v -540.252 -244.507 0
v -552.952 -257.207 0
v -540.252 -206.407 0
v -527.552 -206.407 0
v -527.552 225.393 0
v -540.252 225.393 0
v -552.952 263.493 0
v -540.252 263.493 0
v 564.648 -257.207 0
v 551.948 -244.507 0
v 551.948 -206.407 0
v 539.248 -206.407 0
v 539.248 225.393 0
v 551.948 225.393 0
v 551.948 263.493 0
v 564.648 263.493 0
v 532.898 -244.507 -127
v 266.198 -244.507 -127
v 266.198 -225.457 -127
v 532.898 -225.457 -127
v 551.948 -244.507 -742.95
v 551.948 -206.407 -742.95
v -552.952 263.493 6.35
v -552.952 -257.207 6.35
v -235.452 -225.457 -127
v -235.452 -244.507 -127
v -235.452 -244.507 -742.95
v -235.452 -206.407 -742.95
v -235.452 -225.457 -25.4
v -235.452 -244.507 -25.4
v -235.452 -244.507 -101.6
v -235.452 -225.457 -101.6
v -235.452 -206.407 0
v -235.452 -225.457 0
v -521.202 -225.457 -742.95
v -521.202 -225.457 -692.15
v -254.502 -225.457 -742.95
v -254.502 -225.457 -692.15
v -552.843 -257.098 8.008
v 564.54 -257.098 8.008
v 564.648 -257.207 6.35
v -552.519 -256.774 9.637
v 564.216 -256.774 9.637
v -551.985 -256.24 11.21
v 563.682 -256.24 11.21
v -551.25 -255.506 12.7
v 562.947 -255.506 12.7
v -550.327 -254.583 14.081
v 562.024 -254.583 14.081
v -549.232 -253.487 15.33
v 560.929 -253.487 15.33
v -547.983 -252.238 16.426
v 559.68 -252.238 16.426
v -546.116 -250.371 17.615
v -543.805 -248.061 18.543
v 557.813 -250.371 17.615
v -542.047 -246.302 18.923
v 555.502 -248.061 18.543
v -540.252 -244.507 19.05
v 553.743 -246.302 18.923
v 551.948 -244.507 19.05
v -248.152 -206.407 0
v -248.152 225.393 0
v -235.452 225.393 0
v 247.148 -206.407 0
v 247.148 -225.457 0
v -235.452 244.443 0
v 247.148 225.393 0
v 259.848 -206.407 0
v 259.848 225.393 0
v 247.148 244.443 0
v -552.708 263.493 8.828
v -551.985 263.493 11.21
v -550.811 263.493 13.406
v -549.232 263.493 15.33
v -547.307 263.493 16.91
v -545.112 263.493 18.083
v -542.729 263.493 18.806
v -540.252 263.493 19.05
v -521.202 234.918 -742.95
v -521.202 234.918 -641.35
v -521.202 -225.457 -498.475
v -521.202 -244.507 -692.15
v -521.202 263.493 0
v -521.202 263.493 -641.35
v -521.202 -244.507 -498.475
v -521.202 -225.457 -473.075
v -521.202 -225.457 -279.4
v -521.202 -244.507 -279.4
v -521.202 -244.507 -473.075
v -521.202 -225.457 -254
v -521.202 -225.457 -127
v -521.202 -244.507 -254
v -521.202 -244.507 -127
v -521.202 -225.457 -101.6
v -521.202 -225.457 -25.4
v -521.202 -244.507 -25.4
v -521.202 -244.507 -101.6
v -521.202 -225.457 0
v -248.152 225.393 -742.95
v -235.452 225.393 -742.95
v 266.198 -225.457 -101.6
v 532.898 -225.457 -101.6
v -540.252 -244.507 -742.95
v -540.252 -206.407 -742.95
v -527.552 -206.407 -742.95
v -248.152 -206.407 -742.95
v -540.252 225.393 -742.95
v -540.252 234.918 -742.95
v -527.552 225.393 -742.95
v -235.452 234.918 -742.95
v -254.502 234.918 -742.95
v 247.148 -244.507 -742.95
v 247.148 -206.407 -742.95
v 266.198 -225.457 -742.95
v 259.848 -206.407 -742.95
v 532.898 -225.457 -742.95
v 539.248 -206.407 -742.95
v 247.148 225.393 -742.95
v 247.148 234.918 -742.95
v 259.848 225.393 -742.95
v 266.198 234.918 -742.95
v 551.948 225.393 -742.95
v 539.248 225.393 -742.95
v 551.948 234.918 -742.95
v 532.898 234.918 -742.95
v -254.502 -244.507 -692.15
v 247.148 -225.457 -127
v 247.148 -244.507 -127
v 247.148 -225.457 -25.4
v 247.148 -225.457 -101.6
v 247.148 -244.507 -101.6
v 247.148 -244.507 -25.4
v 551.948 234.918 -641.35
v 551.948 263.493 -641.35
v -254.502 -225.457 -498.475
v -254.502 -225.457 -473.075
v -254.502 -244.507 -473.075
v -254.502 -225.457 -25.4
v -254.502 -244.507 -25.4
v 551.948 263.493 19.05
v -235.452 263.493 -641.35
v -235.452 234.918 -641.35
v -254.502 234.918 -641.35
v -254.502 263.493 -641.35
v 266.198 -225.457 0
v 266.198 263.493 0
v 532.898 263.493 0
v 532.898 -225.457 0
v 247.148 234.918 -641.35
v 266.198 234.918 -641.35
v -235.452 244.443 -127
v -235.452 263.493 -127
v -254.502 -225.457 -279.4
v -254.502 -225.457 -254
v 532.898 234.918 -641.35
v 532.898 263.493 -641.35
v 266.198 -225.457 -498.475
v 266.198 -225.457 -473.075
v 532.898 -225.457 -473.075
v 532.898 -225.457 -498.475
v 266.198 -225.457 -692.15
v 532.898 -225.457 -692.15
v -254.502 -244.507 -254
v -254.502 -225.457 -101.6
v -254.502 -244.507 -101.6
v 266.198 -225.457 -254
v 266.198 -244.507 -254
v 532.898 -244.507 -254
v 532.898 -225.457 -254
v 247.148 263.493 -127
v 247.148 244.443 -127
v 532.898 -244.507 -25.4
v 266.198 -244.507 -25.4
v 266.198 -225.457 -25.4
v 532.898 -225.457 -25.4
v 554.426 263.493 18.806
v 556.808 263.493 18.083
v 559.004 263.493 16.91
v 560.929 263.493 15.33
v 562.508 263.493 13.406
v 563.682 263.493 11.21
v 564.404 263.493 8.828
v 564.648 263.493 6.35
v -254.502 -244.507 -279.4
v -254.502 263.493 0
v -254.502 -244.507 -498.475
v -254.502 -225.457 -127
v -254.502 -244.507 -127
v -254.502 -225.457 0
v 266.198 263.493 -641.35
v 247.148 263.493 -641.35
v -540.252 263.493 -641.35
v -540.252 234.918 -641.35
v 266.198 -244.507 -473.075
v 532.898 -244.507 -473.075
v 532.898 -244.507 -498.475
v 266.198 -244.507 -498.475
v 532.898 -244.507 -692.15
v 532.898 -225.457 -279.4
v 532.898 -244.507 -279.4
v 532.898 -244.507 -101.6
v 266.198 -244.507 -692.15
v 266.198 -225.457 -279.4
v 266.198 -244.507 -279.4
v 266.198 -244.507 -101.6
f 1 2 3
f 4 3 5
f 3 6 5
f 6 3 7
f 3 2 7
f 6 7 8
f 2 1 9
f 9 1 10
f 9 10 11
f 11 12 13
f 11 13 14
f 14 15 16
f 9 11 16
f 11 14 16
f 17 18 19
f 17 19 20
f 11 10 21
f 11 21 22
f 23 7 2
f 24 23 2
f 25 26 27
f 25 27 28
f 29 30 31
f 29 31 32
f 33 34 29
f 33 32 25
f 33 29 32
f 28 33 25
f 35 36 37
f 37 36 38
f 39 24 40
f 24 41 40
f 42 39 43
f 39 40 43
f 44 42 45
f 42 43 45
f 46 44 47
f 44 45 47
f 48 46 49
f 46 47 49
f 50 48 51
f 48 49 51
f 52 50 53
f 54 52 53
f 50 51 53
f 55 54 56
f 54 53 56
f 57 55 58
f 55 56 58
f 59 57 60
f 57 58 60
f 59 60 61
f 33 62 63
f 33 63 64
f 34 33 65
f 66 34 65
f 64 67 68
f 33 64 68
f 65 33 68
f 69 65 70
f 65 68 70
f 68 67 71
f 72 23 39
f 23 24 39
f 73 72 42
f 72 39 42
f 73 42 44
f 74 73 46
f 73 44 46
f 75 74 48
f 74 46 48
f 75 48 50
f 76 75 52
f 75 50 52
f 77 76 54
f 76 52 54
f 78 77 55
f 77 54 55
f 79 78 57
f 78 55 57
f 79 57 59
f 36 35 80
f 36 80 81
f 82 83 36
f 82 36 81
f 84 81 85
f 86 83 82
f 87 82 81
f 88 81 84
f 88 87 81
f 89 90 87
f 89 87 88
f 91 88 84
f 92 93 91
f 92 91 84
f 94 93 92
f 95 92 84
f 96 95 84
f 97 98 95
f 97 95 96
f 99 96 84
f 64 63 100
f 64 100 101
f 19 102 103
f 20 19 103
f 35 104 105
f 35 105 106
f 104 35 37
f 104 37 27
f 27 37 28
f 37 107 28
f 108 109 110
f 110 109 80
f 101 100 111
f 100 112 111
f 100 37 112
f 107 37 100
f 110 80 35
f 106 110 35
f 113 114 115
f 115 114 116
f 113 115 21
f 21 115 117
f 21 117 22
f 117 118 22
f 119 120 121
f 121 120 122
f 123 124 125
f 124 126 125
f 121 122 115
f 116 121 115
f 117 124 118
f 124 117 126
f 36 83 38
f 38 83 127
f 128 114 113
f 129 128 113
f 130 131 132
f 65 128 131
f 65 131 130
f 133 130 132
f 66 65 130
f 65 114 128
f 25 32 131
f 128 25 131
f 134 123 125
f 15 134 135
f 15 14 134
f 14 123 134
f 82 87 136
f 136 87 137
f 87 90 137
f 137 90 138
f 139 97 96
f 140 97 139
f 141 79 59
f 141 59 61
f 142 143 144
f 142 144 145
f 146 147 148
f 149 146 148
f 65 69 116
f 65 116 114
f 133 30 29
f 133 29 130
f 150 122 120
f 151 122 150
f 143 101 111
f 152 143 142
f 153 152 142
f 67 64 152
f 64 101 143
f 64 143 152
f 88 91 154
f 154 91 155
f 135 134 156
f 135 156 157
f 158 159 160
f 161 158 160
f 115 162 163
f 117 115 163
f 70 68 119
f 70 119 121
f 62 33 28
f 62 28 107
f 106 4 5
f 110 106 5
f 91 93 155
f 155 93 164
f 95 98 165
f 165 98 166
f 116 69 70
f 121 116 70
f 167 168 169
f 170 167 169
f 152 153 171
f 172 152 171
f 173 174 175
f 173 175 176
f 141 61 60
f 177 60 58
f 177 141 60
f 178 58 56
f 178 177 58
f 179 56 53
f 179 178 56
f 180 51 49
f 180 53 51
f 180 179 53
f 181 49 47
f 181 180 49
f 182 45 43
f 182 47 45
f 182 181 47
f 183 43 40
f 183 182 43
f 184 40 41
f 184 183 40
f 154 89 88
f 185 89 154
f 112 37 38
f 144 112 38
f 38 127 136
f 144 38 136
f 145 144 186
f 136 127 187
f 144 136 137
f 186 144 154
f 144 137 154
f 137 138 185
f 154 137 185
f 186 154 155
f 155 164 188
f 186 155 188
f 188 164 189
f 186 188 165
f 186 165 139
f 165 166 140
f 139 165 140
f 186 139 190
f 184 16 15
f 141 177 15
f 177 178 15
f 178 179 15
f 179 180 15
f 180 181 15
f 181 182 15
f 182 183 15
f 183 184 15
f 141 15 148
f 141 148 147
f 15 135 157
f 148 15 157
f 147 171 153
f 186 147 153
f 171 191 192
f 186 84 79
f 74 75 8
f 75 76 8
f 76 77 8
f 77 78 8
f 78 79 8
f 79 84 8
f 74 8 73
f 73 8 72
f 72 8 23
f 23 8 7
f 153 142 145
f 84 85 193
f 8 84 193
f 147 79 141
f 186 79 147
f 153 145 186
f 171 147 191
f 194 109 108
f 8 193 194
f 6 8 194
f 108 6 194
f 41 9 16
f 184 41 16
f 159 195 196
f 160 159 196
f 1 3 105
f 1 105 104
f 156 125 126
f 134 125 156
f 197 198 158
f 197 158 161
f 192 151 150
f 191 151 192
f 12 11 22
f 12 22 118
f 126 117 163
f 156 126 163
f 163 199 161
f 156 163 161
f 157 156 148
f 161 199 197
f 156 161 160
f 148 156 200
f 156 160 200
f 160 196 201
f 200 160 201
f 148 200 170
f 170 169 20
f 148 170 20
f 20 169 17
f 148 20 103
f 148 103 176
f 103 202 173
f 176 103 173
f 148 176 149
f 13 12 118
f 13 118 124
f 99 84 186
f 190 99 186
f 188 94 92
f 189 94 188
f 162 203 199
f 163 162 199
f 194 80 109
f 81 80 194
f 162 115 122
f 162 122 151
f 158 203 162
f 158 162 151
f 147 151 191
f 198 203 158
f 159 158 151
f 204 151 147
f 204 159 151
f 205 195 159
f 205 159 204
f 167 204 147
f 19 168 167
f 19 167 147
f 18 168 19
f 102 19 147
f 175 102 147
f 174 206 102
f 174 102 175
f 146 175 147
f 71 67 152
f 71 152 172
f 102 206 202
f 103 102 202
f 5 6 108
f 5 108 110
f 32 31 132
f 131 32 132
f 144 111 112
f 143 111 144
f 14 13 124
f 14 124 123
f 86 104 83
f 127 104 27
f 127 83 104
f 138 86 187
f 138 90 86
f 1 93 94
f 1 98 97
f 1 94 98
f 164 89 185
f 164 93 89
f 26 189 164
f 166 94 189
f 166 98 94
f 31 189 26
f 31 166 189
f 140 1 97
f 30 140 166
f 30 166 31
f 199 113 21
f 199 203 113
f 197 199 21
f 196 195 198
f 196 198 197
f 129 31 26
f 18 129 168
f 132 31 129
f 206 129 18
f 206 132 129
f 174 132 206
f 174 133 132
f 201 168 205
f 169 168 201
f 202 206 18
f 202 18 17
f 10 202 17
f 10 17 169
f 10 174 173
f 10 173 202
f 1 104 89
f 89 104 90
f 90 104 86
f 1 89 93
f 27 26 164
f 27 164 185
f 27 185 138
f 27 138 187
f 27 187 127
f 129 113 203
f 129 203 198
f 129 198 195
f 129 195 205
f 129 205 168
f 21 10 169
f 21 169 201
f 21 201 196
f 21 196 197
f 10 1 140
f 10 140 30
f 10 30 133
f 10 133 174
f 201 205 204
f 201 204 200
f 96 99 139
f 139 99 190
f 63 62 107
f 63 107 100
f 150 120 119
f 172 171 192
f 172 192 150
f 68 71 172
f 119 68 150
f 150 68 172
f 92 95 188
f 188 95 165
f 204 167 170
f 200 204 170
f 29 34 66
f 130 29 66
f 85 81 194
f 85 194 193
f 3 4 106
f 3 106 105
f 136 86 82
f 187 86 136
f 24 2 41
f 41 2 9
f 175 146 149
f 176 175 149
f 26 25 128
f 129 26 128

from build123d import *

# Parameters (mm, degrees)
F0_W      = 266.7
F0_H      = 19.05
F0_W_2    = 6.35
F0_H_2    = 431.8
F0_W_3    = 482.6
F1_DEPTH  = 19.05
F2_DEPTH  = 742.95
F3_R      = 12.7
F4_DEPTH  = 127
F5_DEPTH  = 127
F6_DEPTH  = 742.95
F7_W      = 482.6
F7_H      = 76.2
F7_W_2    = 266.7
F7_H_2    = 193.675
F7_H_3    = 127
F8_DEPTH  = 25.4
F9_W      = 28.575
F9_H      = 101.6
F10_DEPTH = 1104.901


with BuildPart() as f1:
    # F0 (on Top) → F1 (new body)
    with BuildSketch(Plane.XY):
        Polygon((532.898358, 244.44298), (266.198358, 244.44298), (266.198358, 225.39298), (266.198358, -206.40702), (266.198358, -225.45702), (532.898358, -225.45702), (532.898358, -206.40702), (532.898358, 225.39298), align=None)
        Polygon((266.198358, 263.49298), (247.148358, 263.49298), (247.148358, 244.44298), (247.148358, 225.39298), (259.848358, 225.39298), (266.198358, 225.39298), (266.198358, 244.44298), align=None)
        with Locations((399.548358, 253.96798)):
            Rectangle(F0_W, F0_H)
        Polygon((551.948358, 263.49298), (532.898358, 263.49298), (532.898358, 244.44298), (532.898358, 225.39298), (539.248358, 225.39298), (551.948358, 225.39298), align=None)
        with Locations((263.023358, 9.49298)):
            Rectangle(F0_W_2, F0_H_2)
        with Locations((536.073358, 9.49298)):
            Rectangle(F0_W_2, F0_H_2)
        with Locations((-387.851642, 253.96798)):
            Rectangle(F0_W, F0_H)
        Polygon((-235.451642, 263.49298), (-254.501642, 263.49298), (-254.501642, 244.44298), (-254.501642, 225.39298), (-248.151642, 225.39298), (-235.451642, 225.39298), (-235.451642, 244.44298), align=None)
        with Locations((-387.851642, -234.98202)):
            Rectangle(F0_W, F0_H)
        with Locations((399.548358, -234.98202)):
            Rectangle(F0_W, F0_H)
        Polygon((-521.201642, -225.45702), (-521.201642, -206.40702), (-527.551642, -206.40702), (-540.251642, -206.40702), (-540.251642, -244.50702), (-521.201642, -244.50702), align=None)
        Polygon((-248.151642, -206.40702), (-254.501642, -206.40702), (-254.501642, -225.45702), (-254.501642, -244.50702), (-235.451642, -244.50702), (-235.451642, -225.45702), (-235.451642, -206.40702), align=None)
        Polygon((266.198358, -206.40702), (259.848358, -206.40702), (247.148358, -206.40702), (247.148358, -225.45702), (247.148358, -244.50702), (266.198358, -244.50702), (266.198358, -225.45702), align=None)
        Polygon((539.248358, -206.40702), (532.898358, -206.40702), (532.898358, -225.45702), (532.898358, -244.50702), (551.948358, -244.50702), (551.948358, -206.40702), align=None)
        Polygon((-521.201642, 244.44298), (-521.201642, 263.49298), (-540.251642, 263.49298), (-540.251642, 225.39298), (-527.551642, 225.39298), (-521.201642, 225.39298), align=None)
        with Locations((-524.376642, 9.49298)):
            Rectangle(F0_W_2, F0_H_2)
        with Locations((-251.326642, 9.49298)):
            Rectangle(F0_W_2, F0_H_2)
        Polygon((-254.501642, 244.44298), (-521.201642, 244.44298), (-521.201642, 225.39298), (-521.201642, -206.40702), (-521.201642, -225.45702), (-254.501642, -225.45702), (-254.501642, -206.40702), (-254.501642, 225.39298), align=None)
        Polygon((-540.251642, 225.39298), (-540.251642, 263.49298), (-552.951642, 263.49298), (-552.951642, -257.20702), (564.648358, -257.20702), (564.648358, 263.49298), (551.948358, 263.49298), (551.948358, 225.39298), (539.248358, 225.39298), (539.248358, -206.40702), (551.948358, -206.40702), (551.948358, -244.50702), (532.898358, -244.50702), (266.198358, -244.50702), (247.148358, -244.50702), (-235.451642, -244.50702), (-254.501642, -244.50702), (-521.201642, -244.50702), (-540.251642, -244.50702), (-540.251642, -206.40702), (-527.551642, -206.40702), (-527.551642, 225.39298), align=None)
        with Locations((5.848358, 253.96798)):
            Rectangle(F0_W_3, F0_H)
        Polygon((247.148358, 244.44298), (-235.451642, 244.44298), (-235.451642, 225.39298), (-248.151642, 225.39298), (-248.151642, -206.40702), (-235.451642, -206.40702), (-235.451642, -225.45702), (247.148358, -225.45702), (247.148358, -206.40702), (259.848358, -206.40702), (259.848358, 225.39298), (247.148358, 225.39298), align=None)
        with Locations((5.848358, -234.98202)):
            Rectangle(F0_W_3, F0_H)
    extrude(amount=F1_DEPTH)

    # F0 (on Top) → F2 (join)
    with BuildSketch(Plane.XY):
        Polygon((-248.151642, -206.40702), (-254.501642, -206.40702), (-254.501642, -225.45702), (-254.501642, -244.50702), (-235.451642, -244.50702), (-235.451642, -225.45702), (-235.451642, -206.40702), align=None)
        Polygon((-521.201642, -225.45702), (-521.201642, -206.40702), (-527.551642, -206.40702), (-540.251642, -206.40702), (-540.251642, -244.50702), (-521.201642, -244.50702), align=None)
        with Locations((-524.376642, 9.49298)):
            Rectangle(F0_W_2, F0_H_2)
        with Locations((-251.326642, 9.49298)):
            Rectangle(F0_W_2, F0_H_2)
        Polygon((-521.201642, 244.44298), (-521.201642, 263.49298), (-540.251642, 263.49298), (-540.251642, 225.39298), (-527.551642, 225.39298), (-521.201642, 225.39298), align=None)
        Polygon((-235.451642, 263.49298), (-254.501642, 263.49298), (-254.501642, 244.44298), (-254.501642, 225.39298), (-248.151642, 225.39298), (-235.451642, 225.39298), (-235.451642, 244.44298), align=None)
        Polygon((266.198358, 263.49298), (247.148358, 263.49298), (247.148358, 244.44298), (247.148358, 225.39298), (259.848358, 225.39298), (266.198358, 225.39298), (266.198358, 244.44298), align=None)
        Polygon((551.948358, 263.49298), (532.898358, 263.49298), (532.898358, 244.44298), (532.898358, 225.39298), (539.248358, 225.39298), (551.948358, 225.39298), align=None)
        Polygon((266.198358, -206.40702), (259.848358, -206.40702), (247.148358, -206.40702), (247.148358, -225.45702), (247.148358, -244.50702), (266.198358, -244.50702), (266.198358, -225.45702), align=None)
        Polygon((539.248358, -206.40702), (532.898358, -206.40702), (532.898358, -225.45702), (532.898358, -244.50702), (551.948358, -244.50702), (551.948358, -206.40702), align=None)
        with Locations((536.073358, 9.49298)):
            Rectangle(F0_W_2, F0_H_2)
        with Locations((263.023358, 9.49298)):
            Rectangle(F0_W_2, F0_H_2)
    extrude(amount=-F2_DEPTH)

    # F3
    f3_edges = [f1.edges().sort_by_distance(p)[0] for p in [
        (-552.951642, 3.14298, 19.05),
        (5.848358, -257.20702, 19.05),
        (564.648358, 3.14298, 19.05),
    ]]
    fillet(f3_edges, radius=F3_R)

    # F0 (on Top) → F4 (join)
    with BuildSketch(Plane.XY):
        with Locations((5.848358, 253.96798)):
            Rectangle(F0_W_3, F0_H)
    extrude(amount=-F4_DEPTH)

    # F0 (on Top) → F5 (join)
    with BuildSketch(Plane.XY):
        with Locations((5.848358, -234.98202)):
            Rectangle(F0_W_3, F0_H)
    extrude(amount=-F5_DEPTH)

    # F0 (on Top) → F6 (join, through all)
    with BuildSketch(Plane.XY):
        with Locations((-387.851642, -234.98202)):
            Rectangle(F0_W, F0_H)
        with Locations((399.548358, -234.98202)):
            Rectangle(F0_W, F0_H)
    extrude(amount=-F6_DEPTH)

    # F7 (on face) → F8 (cut)
    with BuildSketch(Plane.XZ.offset(244.50702)):
        with Locations((5.848358, -63.5)):
            Rectangle(F7_W, F7_H)
        with Locations((-387.851642, -376.2375)):
            Rectangle(F7_W_2, F7_H_2)
        with Locations((-387.851642, -190.5)):
            Rectangle(F7_W_2, F7_H_3)
        with Locations((-387.851642, -63.5)):
            Rectangle(F7_W_2, F7_H)
        with Locations((-387.851642, -595.3125)):
            Rectangle(F7_W_2, F7_H_2)
        with Locations((399.548358, -595.3125)):
            Rectangle(F7_W_2, F7_H_2)
        with Locations((399.548358, -376.2375)):
            Rectangle(F7_W_2, F7_H_2)
        with Locations((399.548358, -190.5)):
            Rectangle(F7_W_2, F7_H_3)
        with Locations((399.548358, -63.5)):
            Rectangle(F7_W_2, F7_H)
    extrude(amount=-F8_DEPTH, mode=Mode.SUBTRACT)

    # F9 (on face) → F10 (cut, through all)
    with BuildSketch(Plane.YZ.offset(551.948358)):
        with Locations((249.20548, -692.15)):
            Rectangle(F9_W, F9_H)
    extrude(amount=-F10_DEPTH, mode=Mode.SUBTRACT)


solid = f1.part
